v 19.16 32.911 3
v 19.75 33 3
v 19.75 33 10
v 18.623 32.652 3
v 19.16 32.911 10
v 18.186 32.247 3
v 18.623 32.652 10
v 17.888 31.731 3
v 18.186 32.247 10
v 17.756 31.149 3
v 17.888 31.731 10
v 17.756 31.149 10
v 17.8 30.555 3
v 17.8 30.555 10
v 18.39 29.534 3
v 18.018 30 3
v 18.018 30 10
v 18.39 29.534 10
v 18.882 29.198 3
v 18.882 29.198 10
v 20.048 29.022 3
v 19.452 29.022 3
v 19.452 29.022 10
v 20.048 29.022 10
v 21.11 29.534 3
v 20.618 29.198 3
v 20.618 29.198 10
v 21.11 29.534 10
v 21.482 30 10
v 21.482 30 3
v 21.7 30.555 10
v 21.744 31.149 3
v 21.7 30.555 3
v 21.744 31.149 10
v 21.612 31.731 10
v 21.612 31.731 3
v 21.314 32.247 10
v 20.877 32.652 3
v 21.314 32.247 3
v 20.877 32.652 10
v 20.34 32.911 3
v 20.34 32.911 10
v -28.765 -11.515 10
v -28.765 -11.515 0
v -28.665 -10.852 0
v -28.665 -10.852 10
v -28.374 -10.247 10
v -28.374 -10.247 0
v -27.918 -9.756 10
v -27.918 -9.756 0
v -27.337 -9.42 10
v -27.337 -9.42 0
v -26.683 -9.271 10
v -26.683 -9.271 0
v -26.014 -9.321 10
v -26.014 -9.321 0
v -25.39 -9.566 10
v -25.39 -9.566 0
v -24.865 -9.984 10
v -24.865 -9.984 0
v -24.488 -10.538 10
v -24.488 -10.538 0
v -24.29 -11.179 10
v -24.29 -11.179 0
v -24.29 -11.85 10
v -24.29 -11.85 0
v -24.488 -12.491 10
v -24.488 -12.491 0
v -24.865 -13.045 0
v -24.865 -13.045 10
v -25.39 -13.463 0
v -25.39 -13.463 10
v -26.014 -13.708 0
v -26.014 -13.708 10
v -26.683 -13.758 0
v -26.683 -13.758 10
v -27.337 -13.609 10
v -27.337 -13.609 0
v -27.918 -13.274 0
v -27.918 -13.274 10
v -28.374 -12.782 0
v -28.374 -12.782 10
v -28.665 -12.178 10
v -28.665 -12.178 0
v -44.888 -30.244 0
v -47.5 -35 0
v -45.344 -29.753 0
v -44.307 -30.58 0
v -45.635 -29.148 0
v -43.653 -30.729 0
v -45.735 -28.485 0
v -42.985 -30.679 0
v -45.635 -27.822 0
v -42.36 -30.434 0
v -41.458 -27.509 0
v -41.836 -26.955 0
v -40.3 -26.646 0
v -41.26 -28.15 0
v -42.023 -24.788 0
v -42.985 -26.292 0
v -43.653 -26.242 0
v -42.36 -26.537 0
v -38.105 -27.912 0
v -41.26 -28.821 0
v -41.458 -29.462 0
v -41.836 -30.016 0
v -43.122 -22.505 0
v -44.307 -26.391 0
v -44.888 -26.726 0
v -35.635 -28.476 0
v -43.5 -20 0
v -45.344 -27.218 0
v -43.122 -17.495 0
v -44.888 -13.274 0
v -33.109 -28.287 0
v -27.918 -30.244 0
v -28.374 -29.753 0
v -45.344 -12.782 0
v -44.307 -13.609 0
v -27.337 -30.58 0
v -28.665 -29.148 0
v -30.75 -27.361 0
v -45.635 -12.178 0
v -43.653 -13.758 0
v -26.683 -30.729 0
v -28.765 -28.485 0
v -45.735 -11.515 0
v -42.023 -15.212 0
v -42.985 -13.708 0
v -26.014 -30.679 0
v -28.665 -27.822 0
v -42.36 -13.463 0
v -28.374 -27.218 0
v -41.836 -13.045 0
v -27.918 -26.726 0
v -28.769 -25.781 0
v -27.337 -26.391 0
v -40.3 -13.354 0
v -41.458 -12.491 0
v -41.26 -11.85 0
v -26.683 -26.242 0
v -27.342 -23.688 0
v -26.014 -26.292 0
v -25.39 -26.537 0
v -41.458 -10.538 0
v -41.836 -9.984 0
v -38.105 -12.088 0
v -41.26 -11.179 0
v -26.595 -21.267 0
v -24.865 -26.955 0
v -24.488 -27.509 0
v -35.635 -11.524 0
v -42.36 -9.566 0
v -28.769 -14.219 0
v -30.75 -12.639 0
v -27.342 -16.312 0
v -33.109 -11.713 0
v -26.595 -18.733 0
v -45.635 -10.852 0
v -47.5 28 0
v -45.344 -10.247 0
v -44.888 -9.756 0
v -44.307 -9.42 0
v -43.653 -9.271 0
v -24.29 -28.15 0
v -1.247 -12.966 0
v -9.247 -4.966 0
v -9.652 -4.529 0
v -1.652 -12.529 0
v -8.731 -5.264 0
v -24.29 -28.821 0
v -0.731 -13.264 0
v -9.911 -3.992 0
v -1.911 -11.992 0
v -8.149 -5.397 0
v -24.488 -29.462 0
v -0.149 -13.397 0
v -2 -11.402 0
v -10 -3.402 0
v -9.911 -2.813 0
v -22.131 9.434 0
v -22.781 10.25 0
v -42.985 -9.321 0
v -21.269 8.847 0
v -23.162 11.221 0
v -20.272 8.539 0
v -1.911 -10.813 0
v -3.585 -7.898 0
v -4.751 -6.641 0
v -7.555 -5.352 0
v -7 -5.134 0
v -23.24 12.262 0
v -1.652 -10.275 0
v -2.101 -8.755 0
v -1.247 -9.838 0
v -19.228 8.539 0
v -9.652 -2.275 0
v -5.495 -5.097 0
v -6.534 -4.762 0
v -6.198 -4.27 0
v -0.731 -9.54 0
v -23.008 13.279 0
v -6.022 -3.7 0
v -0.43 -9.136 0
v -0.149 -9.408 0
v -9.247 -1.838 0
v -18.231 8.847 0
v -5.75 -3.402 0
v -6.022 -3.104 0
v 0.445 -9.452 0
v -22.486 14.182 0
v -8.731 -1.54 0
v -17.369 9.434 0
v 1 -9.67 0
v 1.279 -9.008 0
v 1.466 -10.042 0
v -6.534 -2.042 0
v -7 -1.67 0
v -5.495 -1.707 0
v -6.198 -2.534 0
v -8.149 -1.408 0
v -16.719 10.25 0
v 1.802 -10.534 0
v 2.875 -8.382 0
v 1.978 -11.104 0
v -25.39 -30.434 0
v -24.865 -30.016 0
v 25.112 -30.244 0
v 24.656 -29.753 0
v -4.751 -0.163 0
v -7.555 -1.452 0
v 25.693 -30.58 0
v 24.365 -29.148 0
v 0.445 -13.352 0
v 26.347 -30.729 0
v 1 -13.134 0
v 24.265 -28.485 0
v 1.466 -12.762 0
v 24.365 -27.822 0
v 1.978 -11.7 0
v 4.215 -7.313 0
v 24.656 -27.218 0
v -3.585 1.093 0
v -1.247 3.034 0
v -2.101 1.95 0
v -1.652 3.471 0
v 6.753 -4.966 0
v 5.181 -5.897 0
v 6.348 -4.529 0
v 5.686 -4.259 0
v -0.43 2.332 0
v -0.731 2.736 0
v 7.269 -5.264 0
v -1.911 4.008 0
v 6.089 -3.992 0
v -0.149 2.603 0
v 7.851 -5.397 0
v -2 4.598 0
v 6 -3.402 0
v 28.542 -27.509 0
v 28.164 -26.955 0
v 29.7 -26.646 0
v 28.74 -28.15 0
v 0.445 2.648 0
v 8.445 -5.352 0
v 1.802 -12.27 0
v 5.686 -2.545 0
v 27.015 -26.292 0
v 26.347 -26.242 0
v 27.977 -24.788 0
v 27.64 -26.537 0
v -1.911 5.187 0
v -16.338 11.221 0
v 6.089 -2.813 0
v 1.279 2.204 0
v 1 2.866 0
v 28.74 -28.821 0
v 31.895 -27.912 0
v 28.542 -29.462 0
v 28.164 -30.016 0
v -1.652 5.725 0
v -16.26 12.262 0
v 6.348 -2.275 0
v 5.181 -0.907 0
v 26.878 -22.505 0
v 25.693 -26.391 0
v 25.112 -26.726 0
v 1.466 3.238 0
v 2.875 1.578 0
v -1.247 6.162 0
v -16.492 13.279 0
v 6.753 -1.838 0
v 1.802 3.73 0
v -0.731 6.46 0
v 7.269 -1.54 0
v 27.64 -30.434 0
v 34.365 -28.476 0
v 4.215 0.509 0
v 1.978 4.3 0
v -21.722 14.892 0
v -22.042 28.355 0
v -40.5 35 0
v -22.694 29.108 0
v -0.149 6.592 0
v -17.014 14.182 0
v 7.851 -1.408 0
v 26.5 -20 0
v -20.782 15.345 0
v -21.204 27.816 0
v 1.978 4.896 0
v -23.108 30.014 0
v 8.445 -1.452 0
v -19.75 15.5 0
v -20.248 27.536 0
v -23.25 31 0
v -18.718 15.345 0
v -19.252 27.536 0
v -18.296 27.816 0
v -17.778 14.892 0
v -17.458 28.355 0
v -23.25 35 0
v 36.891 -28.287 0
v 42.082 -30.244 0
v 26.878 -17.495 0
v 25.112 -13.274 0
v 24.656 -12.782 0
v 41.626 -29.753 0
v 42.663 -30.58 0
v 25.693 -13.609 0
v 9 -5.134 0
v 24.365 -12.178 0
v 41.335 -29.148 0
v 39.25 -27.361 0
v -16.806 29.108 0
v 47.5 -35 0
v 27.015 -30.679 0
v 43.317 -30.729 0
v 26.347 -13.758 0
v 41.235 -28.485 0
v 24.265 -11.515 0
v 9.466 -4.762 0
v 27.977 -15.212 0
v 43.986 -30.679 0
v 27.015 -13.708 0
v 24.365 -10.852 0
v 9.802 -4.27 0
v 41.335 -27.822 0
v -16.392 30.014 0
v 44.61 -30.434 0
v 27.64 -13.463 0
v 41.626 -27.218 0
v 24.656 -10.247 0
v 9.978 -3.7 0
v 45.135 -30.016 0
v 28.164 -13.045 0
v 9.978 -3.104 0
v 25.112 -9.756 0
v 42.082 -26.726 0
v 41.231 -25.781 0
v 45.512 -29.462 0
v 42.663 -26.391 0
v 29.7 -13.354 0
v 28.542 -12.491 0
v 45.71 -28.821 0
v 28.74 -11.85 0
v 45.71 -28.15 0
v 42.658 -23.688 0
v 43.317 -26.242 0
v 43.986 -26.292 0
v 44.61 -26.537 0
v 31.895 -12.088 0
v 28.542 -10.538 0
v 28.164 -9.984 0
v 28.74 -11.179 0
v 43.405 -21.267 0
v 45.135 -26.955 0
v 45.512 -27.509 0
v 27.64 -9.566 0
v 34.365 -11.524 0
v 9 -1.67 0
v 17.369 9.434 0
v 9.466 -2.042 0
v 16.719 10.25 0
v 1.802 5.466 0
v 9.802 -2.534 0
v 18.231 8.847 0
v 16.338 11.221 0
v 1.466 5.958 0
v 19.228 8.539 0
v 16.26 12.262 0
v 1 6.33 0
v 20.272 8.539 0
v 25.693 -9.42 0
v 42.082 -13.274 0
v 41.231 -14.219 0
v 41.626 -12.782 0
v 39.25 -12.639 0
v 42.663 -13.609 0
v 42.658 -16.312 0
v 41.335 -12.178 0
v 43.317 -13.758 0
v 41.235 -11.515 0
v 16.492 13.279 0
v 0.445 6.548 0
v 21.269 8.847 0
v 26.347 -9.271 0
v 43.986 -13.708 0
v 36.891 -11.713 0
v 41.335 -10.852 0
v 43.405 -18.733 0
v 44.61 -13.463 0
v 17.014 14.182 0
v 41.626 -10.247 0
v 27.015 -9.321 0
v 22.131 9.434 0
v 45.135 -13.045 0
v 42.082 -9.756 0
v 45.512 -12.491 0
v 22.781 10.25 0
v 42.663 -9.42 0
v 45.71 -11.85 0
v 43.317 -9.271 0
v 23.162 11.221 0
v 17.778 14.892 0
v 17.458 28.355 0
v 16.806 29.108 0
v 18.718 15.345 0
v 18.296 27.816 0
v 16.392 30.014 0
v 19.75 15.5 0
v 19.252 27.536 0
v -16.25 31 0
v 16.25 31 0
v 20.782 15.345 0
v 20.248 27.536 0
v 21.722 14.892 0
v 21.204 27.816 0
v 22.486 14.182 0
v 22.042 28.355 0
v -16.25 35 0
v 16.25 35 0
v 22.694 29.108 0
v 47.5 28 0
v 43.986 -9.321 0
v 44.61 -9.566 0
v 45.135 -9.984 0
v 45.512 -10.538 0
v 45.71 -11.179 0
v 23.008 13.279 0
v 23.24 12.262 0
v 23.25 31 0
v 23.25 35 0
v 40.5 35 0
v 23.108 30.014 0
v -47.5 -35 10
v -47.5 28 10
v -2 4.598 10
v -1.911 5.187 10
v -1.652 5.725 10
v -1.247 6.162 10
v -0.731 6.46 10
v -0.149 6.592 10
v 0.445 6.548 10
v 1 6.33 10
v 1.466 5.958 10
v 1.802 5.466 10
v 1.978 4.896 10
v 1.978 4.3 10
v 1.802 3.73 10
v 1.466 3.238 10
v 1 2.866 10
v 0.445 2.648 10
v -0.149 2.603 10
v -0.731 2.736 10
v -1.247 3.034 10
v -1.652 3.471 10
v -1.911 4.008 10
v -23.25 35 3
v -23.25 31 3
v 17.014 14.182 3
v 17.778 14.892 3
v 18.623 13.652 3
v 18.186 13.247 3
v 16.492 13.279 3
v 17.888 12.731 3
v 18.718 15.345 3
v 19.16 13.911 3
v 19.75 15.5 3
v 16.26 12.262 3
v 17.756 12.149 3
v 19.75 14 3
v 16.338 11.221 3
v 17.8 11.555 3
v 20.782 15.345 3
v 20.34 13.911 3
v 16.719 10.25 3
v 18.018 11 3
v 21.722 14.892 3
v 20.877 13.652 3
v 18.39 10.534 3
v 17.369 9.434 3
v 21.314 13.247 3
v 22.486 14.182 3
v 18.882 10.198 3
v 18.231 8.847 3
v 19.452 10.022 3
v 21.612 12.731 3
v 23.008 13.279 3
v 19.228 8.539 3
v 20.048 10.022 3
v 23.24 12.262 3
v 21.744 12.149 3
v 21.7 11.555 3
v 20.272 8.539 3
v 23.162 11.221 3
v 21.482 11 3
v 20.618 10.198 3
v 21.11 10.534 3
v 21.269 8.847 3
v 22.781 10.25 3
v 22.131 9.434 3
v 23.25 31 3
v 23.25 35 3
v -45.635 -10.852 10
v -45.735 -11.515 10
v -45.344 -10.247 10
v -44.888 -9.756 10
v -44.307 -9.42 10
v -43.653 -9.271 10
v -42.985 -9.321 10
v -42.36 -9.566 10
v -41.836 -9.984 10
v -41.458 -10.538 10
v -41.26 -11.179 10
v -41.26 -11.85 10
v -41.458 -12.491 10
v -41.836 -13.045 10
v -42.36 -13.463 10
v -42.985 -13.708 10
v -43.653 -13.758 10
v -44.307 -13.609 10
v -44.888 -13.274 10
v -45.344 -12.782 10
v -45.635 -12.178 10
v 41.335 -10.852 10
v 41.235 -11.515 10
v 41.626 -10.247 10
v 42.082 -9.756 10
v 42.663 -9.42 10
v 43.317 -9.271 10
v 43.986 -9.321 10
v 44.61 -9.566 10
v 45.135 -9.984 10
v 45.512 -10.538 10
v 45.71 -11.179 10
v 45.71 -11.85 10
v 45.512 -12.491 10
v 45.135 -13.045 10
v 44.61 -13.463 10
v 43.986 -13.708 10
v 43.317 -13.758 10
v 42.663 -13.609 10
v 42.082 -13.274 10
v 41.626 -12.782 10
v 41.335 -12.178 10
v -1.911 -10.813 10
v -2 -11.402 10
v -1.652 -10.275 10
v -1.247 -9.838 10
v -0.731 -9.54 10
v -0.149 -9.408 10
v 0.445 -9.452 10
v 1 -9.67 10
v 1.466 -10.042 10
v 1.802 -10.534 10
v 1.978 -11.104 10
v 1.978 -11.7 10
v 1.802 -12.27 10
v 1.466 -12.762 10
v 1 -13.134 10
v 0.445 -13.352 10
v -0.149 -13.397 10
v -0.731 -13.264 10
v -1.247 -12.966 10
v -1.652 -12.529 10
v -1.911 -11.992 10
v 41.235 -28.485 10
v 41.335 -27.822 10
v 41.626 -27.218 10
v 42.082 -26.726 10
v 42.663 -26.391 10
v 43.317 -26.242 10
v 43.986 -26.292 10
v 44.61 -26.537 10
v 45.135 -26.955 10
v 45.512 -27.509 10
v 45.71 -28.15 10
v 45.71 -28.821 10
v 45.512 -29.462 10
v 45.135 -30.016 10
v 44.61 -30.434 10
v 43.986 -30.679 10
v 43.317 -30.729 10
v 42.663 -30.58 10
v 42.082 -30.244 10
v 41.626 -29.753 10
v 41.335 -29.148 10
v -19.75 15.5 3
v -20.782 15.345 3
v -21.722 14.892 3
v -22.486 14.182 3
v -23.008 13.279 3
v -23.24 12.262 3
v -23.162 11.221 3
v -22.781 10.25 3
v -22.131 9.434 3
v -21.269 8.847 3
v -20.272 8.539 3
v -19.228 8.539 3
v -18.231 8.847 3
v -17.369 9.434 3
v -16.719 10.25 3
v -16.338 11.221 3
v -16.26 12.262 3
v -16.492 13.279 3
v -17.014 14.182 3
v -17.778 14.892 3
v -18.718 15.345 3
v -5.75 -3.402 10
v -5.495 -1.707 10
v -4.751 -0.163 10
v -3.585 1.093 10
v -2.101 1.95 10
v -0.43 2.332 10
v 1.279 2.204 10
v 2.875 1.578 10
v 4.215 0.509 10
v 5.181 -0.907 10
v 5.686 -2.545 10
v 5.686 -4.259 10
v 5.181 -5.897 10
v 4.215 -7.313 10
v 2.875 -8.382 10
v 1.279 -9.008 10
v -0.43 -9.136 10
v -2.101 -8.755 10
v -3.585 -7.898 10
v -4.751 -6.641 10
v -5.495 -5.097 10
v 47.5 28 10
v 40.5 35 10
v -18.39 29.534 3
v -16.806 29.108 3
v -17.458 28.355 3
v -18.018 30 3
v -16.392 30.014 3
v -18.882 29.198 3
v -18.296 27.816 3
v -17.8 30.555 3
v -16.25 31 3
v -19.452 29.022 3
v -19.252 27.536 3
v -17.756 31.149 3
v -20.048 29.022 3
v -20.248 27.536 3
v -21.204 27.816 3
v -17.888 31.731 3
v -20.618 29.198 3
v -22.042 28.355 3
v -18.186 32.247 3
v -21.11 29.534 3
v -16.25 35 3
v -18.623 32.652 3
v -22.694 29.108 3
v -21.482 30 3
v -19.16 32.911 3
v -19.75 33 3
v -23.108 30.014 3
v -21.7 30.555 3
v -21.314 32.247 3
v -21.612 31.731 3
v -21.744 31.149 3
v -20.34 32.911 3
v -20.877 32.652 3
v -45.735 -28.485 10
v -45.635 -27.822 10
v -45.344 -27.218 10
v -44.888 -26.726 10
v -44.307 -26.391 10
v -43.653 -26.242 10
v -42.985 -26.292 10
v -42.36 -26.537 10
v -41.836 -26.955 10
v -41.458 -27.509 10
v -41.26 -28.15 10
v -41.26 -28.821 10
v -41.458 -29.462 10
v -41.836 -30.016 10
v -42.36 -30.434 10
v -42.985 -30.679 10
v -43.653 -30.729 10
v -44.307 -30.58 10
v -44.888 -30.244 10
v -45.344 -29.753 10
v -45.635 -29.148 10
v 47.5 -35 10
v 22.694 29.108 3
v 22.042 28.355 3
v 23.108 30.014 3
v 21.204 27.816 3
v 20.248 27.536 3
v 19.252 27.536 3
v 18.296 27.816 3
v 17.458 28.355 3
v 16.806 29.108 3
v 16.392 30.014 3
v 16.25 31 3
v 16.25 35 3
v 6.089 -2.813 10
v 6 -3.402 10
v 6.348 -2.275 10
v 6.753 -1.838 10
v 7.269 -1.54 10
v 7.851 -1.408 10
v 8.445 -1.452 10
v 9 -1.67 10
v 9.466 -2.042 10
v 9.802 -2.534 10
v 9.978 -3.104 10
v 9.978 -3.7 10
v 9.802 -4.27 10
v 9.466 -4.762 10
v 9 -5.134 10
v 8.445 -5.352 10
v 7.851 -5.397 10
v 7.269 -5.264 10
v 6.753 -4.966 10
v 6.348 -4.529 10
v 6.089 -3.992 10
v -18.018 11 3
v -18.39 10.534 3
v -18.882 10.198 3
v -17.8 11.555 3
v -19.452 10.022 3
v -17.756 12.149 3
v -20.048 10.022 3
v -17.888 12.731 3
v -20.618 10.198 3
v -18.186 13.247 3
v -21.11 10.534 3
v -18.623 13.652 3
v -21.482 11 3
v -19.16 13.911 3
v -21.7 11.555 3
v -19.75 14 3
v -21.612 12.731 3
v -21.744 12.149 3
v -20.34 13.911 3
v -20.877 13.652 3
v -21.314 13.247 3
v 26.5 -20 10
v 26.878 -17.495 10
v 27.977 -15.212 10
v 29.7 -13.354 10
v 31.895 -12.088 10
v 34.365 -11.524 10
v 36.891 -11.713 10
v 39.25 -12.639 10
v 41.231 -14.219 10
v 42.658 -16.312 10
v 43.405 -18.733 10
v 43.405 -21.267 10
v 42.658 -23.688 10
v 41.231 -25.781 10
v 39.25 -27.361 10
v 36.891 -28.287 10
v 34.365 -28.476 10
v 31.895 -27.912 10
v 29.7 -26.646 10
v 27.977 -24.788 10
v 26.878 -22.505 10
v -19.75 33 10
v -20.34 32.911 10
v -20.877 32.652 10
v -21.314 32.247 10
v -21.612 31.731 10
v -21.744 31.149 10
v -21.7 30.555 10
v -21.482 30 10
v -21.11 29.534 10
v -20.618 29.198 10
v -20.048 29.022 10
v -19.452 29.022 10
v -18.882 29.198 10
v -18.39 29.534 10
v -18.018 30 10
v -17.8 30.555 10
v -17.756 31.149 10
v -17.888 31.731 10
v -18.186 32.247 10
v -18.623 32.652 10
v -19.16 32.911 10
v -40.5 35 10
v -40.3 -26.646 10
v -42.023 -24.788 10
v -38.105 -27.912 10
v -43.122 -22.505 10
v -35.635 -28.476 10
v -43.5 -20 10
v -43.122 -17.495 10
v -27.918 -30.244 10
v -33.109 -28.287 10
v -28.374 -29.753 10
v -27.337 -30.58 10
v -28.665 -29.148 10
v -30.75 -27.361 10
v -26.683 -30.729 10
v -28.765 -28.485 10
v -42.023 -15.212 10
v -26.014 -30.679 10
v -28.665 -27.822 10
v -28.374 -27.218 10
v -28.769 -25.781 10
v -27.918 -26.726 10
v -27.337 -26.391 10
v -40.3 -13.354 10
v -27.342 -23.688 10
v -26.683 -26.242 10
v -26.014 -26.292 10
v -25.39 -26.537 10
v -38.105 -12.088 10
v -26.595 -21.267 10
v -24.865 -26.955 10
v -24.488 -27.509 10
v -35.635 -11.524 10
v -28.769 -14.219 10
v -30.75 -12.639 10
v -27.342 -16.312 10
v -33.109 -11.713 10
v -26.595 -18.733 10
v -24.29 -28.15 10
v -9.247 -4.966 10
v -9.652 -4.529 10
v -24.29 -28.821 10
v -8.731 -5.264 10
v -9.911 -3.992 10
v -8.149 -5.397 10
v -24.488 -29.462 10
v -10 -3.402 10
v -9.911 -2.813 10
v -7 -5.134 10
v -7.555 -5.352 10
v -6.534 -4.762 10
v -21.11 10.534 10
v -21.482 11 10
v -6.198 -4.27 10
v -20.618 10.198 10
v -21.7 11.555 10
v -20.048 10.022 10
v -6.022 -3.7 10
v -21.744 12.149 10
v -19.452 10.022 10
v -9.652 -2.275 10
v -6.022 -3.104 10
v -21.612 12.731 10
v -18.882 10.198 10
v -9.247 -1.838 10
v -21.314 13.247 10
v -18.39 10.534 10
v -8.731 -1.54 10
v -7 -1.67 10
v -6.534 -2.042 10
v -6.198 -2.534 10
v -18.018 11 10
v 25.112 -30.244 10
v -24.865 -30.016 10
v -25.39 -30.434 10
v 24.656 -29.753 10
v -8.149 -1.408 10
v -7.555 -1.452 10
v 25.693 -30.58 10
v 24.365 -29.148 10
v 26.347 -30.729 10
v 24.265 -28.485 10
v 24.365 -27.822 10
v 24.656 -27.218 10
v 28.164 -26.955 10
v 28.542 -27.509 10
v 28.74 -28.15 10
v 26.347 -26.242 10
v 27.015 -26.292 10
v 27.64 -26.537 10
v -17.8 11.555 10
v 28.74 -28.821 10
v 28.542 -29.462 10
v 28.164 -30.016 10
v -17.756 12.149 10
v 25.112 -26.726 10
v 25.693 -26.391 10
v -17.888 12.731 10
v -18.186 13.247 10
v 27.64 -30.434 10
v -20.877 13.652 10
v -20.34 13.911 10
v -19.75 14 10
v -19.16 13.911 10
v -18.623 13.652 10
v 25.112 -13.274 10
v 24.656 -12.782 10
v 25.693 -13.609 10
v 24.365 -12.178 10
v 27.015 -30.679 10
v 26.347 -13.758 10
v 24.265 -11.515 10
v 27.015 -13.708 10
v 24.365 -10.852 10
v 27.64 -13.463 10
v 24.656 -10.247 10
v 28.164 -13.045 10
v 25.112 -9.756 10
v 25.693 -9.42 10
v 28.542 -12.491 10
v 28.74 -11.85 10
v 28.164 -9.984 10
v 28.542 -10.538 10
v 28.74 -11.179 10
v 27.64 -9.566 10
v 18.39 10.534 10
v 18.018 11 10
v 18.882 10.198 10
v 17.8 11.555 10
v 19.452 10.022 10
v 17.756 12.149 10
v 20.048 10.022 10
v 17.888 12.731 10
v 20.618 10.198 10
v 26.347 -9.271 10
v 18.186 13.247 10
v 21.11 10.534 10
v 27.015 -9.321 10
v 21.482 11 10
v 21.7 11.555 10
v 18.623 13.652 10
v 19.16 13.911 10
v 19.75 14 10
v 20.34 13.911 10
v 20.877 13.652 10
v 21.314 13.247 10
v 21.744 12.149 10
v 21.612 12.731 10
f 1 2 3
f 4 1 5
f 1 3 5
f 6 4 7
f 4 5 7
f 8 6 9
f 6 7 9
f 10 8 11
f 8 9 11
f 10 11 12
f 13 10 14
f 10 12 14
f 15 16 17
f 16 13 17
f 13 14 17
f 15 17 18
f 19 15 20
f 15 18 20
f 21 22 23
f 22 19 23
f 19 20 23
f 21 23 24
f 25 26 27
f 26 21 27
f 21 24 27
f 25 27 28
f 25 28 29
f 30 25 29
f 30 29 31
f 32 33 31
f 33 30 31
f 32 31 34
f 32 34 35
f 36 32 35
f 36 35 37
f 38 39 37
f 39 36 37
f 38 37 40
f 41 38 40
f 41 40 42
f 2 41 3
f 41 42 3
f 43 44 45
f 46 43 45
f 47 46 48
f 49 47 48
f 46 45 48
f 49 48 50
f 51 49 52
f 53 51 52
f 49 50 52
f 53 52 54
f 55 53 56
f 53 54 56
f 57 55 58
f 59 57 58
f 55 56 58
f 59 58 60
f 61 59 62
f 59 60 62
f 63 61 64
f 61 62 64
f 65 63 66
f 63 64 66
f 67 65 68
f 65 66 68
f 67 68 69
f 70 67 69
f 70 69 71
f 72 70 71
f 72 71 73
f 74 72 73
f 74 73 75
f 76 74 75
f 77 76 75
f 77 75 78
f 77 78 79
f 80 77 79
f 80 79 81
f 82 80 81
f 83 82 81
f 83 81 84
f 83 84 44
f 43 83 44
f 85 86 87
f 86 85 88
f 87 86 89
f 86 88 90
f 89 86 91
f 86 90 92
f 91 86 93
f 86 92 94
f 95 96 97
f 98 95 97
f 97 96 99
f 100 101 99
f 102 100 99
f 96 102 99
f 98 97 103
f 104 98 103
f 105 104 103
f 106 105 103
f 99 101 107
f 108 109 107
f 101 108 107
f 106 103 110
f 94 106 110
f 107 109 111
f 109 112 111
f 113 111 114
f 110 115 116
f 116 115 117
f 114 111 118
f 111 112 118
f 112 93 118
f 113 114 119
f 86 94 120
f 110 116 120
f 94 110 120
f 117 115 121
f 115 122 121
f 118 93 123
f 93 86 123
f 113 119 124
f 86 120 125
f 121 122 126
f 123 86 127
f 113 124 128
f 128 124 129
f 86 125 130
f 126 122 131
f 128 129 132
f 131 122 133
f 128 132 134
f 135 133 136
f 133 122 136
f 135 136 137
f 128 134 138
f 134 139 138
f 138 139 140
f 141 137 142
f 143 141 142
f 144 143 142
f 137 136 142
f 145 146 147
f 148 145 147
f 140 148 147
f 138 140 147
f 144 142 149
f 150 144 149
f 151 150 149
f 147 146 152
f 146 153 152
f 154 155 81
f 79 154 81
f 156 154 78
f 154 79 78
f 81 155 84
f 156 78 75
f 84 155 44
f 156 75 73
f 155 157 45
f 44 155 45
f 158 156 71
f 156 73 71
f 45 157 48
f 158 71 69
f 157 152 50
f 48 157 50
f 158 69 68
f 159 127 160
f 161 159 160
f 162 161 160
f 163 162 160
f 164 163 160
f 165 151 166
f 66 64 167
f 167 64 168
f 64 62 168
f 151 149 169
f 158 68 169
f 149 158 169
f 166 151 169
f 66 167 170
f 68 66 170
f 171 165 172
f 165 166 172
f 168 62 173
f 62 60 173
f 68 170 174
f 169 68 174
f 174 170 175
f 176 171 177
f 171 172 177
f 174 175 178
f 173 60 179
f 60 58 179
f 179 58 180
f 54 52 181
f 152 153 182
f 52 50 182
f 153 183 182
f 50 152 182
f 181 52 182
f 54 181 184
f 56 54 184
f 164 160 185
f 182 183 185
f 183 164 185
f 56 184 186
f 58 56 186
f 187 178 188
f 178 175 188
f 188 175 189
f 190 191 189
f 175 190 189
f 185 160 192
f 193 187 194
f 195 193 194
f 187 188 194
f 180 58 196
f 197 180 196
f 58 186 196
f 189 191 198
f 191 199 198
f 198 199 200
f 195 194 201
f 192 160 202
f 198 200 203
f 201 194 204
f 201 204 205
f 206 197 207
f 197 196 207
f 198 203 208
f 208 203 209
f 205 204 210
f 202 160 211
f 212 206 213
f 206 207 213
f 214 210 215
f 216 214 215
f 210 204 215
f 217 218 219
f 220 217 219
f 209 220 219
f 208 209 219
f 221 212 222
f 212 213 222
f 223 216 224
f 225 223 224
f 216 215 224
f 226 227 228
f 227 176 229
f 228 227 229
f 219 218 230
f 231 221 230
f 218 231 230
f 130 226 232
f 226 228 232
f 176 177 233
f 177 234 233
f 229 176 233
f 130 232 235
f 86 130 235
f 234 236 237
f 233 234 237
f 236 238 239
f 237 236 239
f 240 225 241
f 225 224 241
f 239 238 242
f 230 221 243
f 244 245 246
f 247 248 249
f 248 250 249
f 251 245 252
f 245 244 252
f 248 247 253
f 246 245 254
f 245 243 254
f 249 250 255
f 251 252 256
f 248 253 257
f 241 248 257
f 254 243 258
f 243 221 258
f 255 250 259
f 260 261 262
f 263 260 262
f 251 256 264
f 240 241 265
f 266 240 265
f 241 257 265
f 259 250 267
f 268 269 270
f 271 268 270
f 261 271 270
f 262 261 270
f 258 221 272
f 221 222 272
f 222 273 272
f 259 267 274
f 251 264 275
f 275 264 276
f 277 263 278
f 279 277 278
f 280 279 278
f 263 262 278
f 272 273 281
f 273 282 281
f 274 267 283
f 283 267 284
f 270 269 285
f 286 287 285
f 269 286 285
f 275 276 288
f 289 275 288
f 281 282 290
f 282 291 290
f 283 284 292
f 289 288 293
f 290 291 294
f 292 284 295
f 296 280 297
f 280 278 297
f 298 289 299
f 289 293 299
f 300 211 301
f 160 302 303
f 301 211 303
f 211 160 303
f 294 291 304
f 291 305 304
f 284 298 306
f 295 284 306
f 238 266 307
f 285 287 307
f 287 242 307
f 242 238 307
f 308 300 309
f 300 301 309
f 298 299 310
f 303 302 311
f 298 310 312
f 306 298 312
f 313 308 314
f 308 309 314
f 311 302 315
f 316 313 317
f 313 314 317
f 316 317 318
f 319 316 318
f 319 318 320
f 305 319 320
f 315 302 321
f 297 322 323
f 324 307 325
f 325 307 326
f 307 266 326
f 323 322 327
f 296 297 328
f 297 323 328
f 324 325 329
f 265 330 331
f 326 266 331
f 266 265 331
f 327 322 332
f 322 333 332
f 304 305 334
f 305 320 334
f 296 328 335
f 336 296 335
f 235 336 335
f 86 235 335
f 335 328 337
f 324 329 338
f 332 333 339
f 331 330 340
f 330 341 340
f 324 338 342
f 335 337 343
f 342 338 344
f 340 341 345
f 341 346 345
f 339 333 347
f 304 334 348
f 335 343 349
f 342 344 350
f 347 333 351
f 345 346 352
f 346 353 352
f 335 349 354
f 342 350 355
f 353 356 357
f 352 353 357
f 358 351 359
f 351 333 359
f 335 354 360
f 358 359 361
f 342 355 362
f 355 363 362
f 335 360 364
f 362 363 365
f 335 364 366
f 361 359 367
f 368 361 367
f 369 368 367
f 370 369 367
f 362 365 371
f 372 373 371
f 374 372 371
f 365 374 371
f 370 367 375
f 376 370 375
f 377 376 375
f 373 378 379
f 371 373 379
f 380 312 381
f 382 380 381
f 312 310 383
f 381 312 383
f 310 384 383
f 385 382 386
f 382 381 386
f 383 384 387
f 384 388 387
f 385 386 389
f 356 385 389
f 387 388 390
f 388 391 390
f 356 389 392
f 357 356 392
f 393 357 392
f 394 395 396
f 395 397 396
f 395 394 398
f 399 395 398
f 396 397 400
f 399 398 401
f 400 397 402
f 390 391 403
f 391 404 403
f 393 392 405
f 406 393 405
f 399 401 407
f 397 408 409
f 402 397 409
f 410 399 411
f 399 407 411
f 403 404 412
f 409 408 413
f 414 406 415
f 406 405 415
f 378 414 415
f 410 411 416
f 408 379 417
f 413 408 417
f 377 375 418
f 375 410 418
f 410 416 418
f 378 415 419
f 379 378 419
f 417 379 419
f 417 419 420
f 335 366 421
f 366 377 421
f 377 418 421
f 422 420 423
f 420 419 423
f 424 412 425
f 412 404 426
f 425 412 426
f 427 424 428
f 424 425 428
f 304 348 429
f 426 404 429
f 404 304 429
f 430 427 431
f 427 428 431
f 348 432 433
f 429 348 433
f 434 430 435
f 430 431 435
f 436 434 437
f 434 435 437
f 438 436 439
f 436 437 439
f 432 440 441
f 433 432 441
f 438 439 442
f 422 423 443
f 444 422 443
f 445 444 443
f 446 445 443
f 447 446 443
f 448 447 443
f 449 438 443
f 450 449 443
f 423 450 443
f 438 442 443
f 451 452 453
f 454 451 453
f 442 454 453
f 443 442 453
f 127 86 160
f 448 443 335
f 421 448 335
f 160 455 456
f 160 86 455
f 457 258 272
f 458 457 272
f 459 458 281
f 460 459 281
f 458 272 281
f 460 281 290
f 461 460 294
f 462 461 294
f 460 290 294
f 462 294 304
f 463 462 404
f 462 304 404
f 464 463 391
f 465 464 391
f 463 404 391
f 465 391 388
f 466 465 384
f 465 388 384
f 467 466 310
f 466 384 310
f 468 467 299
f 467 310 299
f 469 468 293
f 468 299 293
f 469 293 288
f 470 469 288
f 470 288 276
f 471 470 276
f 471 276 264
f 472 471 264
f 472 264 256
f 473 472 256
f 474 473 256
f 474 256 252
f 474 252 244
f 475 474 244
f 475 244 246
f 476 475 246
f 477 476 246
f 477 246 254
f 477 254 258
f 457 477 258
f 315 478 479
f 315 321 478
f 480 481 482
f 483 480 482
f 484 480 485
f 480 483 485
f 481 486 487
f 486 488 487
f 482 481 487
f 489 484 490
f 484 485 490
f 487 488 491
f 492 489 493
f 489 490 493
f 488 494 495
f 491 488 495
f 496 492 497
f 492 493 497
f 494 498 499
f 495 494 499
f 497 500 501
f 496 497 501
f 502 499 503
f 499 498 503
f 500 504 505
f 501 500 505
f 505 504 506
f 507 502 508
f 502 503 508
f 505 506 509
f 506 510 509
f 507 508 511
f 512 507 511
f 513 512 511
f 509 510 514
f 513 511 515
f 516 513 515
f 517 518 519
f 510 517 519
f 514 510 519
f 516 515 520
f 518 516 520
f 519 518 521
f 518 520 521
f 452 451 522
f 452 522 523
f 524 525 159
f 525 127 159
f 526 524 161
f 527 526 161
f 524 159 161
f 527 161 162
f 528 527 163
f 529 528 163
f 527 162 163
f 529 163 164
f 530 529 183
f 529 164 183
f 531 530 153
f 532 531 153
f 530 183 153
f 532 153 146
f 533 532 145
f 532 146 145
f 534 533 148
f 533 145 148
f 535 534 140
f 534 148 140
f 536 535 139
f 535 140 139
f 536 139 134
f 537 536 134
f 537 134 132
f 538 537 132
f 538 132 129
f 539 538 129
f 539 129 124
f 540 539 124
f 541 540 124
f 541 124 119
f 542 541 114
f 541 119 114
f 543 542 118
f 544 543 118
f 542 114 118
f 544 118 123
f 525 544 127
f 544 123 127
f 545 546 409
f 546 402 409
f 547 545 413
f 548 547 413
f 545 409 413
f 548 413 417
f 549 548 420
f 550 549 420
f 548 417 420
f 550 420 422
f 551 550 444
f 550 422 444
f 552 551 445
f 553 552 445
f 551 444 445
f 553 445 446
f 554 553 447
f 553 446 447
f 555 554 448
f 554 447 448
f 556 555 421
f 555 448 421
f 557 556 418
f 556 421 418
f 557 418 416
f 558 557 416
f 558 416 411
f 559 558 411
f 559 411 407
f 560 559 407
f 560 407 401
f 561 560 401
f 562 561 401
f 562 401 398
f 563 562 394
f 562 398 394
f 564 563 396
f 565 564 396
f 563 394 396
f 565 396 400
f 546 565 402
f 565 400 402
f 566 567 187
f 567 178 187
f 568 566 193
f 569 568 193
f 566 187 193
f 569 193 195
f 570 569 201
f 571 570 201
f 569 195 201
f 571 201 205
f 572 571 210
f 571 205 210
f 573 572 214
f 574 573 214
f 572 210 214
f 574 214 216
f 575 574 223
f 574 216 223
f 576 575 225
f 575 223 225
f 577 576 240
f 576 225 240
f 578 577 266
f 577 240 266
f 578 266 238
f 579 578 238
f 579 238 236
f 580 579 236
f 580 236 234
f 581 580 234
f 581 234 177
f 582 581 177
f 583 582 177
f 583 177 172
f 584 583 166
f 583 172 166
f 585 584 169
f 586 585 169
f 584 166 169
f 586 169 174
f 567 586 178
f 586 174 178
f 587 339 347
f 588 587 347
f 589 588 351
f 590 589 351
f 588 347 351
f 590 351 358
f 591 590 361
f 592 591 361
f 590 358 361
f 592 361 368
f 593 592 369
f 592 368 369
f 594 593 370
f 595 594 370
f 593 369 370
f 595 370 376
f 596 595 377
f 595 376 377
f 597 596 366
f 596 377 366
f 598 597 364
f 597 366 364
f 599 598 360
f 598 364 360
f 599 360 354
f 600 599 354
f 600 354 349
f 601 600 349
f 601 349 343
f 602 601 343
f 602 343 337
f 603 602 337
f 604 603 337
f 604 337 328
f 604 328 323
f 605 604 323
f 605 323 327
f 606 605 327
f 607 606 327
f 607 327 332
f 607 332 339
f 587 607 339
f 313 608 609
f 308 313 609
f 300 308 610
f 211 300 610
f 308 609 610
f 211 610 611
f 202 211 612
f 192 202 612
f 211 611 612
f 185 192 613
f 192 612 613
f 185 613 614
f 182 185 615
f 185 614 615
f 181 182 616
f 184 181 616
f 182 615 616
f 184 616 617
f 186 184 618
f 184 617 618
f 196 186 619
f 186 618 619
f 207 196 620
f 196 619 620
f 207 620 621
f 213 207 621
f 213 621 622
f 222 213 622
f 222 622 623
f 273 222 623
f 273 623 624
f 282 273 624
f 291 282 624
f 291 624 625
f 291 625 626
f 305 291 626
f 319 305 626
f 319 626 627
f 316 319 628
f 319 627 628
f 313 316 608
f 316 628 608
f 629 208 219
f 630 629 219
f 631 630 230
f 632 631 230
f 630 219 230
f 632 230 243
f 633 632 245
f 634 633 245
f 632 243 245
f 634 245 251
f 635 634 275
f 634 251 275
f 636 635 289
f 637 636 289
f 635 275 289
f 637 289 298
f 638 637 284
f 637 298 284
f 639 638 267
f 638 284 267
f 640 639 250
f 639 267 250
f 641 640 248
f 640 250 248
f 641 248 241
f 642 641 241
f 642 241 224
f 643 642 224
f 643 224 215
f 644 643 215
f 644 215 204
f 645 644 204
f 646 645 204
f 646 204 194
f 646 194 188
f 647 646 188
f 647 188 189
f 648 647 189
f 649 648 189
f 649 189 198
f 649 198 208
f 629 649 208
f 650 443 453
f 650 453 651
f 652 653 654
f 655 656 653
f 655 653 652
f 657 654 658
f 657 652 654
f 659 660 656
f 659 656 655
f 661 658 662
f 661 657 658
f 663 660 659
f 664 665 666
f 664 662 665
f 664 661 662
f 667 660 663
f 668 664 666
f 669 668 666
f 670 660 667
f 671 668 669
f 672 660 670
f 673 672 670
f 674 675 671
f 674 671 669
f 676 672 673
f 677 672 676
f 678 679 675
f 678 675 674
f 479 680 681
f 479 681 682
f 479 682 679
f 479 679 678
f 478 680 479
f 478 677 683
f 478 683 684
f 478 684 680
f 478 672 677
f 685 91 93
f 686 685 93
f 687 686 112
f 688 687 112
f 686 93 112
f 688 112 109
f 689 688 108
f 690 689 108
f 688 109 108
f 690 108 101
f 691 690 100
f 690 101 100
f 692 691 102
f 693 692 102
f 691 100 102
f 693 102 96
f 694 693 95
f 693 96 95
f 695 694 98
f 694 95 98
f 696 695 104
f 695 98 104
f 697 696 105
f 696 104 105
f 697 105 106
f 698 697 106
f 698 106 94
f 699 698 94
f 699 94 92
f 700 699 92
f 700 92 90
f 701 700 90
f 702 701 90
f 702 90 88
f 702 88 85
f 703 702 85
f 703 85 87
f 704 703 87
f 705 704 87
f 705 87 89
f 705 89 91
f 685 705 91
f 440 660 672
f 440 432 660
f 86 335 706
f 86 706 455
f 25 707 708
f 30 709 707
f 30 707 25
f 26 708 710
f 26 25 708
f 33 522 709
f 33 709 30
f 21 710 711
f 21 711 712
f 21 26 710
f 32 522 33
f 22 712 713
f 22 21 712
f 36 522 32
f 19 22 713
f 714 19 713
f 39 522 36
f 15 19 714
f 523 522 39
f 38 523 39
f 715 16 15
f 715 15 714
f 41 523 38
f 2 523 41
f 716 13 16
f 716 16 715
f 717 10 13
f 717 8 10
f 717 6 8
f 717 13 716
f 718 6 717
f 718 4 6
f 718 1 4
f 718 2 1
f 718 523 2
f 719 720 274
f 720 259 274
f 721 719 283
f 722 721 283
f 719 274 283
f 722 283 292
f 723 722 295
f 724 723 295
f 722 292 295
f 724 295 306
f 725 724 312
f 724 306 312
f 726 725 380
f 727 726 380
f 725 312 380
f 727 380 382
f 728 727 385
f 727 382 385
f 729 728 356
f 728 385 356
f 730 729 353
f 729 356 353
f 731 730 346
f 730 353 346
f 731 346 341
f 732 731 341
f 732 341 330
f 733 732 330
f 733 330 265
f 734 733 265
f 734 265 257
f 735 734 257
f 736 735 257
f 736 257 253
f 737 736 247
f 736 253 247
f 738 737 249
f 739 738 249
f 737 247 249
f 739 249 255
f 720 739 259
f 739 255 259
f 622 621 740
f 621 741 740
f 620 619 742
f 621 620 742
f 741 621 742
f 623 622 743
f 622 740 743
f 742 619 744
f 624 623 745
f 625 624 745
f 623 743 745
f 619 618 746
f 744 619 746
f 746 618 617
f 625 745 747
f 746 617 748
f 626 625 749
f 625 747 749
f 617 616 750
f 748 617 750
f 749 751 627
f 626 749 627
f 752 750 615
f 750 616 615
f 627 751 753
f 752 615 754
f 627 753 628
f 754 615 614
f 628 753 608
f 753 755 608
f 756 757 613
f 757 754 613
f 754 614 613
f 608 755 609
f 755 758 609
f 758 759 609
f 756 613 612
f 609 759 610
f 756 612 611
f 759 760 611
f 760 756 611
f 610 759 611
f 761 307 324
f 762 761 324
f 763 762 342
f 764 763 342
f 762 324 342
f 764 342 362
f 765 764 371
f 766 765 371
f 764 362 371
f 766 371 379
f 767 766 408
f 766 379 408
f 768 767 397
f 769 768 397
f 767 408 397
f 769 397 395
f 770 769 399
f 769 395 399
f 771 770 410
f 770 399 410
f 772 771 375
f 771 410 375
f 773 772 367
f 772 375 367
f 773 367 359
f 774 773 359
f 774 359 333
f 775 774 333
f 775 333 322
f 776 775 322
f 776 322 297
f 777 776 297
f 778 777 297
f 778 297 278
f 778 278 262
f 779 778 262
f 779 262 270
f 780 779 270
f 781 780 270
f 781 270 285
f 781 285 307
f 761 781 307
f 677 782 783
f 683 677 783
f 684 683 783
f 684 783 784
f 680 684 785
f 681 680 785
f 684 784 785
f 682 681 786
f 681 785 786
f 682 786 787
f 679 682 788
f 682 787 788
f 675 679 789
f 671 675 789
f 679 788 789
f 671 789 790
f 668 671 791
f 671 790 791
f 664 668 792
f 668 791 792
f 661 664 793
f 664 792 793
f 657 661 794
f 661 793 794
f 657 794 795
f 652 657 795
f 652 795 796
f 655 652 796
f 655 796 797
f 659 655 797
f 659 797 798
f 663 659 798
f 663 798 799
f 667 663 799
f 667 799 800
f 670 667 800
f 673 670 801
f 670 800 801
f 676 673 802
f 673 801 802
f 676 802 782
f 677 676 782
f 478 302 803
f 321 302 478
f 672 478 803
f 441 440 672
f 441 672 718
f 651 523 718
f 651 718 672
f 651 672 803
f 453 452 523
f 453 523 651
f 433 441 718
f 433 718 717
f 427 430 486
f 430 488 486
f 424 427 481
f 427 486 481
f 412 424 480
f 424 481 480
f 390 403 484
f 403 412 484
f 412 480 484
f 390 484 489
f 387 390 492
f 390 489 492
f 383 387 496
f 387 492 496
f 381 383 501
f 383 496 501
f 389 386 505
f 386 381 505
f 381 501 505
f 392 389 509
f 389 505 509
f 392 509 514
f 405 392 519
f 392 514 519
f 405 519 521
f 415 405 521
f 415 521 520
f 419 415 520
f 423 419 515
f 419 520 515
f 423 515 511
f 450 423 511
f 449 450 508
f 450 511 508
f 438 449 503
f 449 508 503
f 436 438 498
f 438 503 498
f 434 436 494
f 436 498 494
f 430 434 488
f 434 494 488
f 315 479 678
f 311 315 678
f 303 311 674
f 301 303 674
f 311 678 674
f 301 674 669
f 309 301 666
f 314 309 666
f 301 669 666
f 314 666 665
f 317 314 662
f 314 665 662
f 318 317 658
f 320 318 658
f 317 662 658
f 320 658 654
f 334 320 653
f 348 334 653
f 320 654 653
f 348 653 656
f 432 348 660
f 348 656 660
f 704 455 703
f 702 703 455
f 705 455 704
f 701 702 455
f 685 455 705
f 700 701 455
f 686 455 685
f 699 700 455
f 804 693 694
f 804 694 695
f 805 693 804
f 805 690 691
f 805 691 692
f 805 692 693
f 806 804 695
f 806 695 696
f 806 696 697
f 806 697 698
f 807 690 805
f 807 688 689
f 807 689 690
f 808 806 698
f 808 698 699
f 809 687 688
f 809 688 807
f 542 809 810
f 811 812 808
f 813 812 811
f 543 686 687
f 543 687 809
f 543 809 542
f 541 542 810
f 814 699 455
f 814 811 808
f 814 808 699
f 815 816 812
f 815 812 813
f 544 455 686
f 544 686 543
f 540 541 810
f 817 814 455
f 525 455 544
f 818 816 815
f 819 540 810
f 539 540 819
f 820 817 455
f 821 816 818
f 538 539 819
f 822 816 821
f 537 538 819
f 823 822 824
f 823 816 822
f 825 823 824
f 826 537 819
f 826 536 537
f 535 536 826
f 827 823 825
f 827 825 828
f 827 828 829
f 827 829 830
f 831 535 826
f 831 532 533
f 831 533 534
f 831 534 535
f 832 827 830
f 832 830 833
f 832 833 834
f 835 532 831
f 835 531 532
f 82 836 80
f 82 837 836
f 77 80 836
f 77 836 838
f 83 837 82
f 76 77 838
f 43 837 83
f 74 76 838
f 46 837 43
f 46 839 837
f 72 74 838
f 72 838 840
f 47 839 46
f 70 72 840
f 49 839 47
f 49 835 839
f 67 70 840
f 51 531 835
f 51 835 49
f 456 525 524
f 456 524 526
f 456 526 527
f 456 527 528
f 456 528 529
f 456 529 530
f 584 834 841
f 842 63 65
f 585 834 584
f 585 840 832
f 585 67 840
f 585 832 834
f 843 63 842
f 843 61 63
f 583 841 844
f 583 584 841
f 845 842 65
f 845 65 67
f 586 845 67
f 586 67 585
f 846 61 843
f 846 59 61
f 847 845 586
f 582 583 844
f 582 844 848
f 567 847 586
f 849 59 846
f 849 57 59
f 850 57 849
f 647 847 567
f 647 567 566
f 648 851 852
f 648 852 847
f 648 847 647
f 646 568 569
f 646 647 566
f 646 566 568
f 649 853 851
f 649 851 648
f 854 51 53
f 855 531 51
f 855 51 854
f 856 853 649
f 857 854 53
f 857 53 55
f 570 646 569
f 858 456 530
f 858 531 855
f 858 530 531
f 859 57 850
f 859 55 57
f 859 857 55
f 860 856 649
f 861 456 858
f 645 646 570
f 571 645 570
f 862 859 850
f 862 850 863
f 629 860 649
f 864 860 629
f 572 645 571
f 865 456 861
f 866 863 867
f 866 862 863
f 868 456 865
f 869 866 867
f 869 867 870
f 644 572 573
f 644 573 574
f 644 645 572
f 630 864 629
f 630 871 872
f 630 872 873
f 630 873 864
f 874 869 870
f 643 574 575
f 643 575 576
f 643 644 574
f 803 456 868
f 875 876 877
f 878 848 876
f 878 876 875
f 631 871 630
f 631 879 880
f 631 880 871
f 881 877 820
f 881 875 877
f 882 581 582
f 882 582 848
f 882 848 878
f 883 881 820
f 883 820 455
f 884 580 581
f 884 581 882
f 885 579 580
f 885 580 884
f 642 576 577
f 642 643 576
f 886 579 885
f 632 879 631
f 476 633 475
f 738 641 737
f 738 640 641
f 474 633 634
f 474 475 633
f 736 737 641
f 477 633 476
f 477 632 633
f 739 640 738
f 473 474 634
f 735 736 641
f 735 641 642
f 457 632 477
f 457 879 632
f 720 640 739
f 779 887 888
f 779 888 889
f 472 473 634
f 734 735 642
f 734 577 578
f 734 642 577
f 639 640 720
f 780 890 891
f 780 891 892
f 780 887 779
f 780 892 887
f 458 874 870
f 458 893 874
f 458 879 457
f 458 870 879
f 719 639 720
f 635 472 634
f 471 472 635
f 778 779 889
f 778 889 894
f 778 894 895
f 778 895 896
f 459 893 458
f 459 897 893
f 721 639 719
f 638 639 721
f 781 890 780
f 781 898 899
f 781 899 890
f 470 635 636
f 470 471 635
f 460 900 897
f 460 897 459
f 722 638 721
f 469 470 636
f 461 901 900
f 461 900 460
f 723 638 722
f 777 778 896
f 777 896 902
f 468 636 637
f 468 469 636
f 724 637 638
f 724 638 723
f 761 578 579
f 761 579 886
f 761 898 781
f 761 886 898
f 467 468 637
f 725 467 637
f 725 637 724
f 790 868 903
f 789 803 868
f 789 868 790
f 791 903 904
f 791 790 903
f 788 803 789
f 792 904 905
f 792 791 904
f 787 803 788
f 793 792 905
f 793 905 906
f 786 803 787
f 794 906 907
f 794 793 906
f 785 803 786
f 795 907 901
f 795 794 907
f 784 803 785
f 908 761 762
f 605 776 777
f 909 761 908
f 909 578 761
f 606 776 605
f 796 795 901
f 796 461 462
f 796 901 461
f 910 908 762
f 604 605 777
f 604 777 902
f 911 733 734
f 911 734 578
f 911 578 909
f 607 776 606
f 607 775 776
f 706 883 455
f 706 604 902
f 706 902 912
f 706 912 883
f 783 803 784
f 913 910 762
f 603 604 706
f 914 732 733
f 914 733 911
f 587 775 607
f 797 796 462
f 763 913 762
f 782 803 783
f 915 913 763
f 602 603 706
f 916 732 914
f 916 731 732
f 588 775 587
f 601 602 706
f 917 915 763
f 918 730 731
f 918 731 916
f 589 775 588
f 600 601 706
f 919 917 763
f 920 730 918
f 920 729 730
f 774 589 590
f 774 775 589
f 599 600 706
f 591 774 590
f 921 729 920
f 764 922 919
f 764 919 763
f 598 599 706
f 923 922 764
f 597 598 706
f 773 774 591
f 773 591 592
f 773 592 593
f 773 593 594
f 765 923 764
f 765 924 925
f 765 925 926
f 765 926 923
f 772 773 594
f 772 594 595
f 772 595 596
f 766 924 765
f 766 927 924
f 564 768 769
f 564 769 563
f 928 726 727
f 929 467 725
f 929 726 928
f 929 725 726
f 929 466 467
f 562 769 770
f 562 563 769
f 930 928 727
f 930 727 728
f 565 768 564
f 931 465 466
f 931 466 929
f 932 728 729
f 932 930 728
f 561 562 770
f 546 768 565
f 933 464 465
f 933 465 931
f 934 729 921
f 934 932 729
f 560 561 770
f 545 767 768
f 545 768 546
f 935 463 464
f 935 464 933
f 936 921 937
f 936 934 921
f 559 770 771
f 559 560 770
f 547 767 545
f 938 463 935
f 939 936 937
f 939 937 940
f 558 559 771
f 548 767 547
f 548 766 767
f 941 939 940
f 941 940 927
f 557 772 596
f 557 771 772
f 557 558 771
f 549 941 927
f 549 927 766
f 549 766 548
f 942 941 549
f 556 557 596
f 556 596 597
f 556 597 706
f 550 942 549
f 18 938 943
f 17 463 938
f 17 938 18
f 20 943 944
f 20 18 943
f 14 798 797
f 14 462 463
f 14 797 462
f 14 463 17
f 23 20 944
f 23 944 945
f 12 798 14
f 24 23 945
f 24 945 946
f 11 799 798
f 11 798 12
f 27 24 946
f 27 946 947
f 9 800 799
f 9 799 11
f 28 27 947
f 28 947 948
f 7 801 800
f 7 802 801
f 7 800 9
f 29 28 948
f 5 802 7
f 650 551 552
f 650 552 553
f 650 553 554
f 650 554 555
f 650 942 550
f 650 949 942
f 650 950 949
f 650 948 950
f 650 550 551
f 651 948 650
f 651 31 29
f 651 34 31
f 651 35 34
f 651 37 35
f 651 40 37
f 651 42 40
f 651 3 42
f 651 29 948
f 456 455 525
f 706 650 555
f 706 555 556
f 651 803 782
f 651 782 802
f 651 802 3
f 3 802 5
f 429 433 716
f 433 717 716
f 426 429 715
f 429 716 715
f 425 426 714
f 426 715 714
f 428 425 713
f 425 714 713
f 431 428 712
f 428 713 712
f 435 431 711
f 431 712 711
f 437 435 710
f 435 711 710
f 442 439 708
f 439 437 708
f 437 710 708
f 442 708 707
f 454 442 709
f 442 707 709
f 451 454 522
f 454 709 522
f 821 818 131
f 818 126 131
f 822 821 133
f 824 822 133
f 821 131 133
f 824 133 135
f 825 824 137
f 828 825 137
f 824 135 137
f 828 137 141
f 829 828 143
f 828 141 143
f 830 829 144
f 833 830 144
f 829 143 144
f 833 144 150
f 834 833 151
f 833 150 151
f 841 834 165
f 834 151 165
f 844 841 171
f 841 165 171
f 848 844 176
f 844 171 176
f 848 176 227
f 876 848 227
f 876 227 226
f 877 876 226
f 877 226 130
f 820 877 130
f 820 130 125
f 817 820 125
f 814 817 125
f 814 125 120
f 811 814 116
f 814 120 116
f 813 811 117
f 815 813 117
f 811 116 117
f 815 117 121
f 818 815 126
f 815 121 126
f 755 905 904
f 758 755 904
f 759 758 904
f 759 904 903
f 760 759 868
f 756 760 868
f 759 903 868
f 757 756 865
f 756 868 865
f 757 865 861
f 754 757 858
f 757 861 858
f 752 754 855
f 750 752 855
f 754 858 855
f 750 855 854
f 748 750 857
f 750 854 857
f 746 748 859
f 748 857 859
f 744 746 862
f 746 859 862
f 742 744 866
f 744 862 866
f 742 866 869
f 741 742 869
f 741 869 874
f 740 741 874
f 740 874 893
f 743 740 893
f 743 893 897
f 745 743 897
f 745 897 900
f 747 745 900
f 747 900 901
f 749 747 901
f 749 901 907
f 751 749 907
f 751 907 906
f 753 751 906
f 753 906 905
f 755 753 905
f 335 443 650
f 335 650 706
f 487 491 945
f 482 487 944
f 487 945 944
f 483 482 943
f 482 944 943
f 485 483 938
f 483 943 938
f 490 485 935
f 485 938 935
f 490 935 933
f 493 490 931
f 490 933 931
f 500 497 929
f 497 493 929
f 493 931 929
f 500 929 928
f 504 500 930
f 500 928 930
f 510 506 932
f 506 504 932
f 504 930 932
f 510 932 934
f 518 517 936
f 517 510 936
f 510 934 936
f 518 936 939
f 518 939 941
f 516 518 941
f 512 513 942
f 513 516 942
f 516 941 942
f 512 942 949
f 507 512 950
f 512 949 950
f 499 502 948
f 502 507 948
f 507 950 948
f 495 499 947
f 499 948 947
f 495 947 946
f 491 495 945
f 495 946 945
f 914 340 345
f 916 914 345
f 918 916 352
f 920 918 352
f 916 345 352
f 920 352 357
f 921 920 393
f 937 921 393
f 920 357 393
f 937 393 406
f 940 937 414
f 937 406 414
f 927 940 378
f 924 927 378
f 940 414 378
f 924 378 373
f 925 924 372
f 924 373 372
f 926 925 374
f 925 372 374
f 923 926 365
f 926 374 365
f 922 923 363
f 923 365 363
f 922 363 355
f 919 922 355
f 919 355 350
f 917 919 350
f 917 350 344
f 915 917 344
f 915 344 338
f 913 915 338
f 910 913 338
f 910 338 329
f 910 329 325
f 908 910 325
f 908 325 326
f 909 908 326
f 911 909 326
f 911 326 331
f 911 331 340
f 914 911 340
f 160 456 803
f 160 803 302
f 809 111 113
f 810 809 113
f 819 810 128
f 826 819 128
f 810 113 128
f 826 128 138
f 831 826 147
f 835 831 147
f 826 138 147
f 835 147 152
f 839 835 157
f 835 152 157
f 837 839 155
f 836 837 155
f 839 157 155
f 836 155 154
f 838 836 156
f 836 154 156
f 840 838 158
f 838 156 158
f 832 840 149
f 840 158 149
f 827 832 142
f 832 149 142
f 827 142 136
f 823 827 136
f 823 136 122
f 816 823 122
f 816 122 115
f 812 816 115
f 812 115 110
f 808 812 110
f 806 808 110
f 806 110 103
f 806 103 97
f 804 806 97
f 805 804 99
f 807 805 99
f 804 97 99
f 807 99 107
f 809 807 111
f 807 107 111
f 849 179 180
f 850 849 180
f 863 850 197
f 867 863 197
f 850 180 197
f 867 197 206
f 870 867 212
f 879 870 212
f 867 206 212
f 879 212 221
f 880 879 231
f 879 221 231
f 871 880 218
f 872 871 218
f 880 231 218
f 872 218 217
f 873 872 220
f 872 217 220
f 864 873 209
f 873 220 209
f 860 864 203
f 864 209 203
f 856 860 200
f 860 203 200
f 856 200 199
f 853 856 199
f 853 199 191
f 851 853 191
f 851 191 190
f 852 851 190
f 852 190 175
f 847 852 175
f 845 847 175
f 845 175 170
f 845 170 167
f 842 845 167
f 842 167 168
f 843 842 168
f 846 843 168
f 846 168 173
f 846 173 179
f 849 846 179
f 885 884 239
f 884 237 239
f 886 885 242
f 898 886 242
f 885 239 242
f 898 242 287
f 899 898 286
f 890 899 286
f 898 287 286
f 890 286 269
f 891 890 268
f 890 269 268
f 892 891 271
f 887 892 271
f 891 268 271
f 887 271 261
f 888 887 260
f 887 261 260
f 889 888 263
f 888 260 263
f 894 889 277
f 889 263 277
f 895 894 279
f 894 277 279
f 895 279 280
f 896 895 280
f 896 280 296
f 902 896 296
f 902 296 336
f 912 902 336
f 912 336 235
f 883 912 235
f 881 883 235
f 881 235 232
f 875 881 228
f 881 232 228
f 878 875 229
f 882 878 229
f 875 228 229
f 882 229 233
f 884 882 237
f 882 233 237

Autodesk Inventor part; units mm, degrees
ref_plane "YZ Plane" through (0, 0, 0) normal (1, 0, 0) x (0, 1, 0)
ref_plane "XZ Plane" through (0, 0, 0) normal (0, 1, 0) x (-1, 0, 0)
ref_plane "XY Plane" through (0, 0, 0) normal (0, 0, 1) x (1, 0, 0)
sketch "Sketch1" plane through (0, 0, 0) normal (0, 0, 1) x (1, 0, 0)
  line L0 (-47.5, 35) -> (47.5, 35)
  line L1 (47.5, 35) -> (47.5, -35)
  line L2 (47.5, -35) -> (-47.5, -35)
  line L3 (-47.5, -35) -> (-47.5, 35)
  point P0 (0, 0)
  point P1 (0, 35)
  point P2 (-47.5, 0)
  dimension "d0" = 95
  dimension "d1" = 70
extrude "Extrusion1" add sketch "Sketch1" along normal blind 10
sketch "Sketch2" plane through (0, 0, 0) normal (0, 0, -1) x (-1, 0, 0)
  line L0 (0, 71.7114) -> (0, -41.7697) construction
  line L1 (-47.5, 35) -> (47.5, 35) construction
  line L2 (-22.5, 19.157) -> (-23.5, 19.157) projected
  circle A0 centre (35, -20) radius 8.5
  line L3 (47.5, -35) -> (-47.5, -35) projected
  line L4 (-47.5, -35) -> (-47.5, 35) projected
  circle A1 centre (43.4853, -28.4853) radius 2.25
  line L5 (47.5, 35) -> (47.5, -35) construction
  line L6 (26.5147, -11.5147) -> (43.4853, -11.5147) construction
  line L7 (43.4853, -11.5147) -> (43.4853, -28.4853) construction
  line L8 (43.4853, -28.4853) -> (26.5147, -28.4853) construction
  line L9 (26.5147, -28.4853) -> (26.5147, -11.5147) construction
  circle A2 centre (43.4853, -11.5147) radius 2.25
  circle A3 centre (26.5147, -11.5147) radius 2.25
  circle A4 centre (26.5147, -28.4853) radius 2.25
  circle A5 centre (-35, -20) radius 8.5
  circle A6 centre (-43.4853, -28.4853) radius 2.25
  circle A7 centre (-43.4853, -11.5147) radius 2.25
  circle A8 centre (-26.5147, -11.5147) radius 2.25
  circle A9 centre (-26.5147, -28.4853) radius 2.25
  point P0 (0, 0)
  point P1 (0, 14.9709)
  point P2 (0, 35)
  point P3 (35, -11.5147)
  point P4 (26.5147, -20)
  dimension "d21" = 15
  dimension "d22" = 12.5
  dimension "d23" = 17
  dimension "d26" = 4.5
  dimension "d27" = 16.9706
  dimension "d28" = 16.9706
extrude "Extrusion2" cut sketch "Sketch2" against normal through all
sketch "Sketch3" plane through (0, 0, 0) normal (0, 0, -1) x (-1, 0, 0)
  circle A0 centre (0, -3.4021) radius 5.75
  circle A1 centre (35, -20) radius 8.5 projected
  line L0 (-47.5, 35) -> (47.5, 35) projected
  line L1 (47.5, 35) -> (47.5, -35) projected
  line L2 (47.5, -35) -> (-47.5, -35) projected
  line L3 (-47.5, -35) -> (-47.5, 35) projected
  circle A2 centre (35, -20) radius 8.5 projected
  circle A3 centre (0, 4.5979) radius 2
  circle A4 centre (-8, -3.4021) radius 2
  circle A5 centre (0, -11.4021) radius 2
  circle A6 centre (8, -3.4021) radius 2
  circle A7 centre (26.5147, -11.5147) radius 2.25 projected
  circle A8 centre (-43.4853, -28.4853) radius 2.25 projected
  circle A9 centre (-43.4853, -11.5147) radius 2.25 projected
  circle A10 centre (26.5147, -28.4853) radius 2.25 projected
  circle A11 centre (43.4853, -11.5147) radius 2.25 projected
  circle A12 centre (-26.5147, -28.4853) radius 2.25 projected
  circle A13 centre (-26.5147, -11.5147) radius 2.25 projected
  circle A14 centre (43.4853, -28.4853) radius 2.25 projected
  circle A15 centre (26.5147, -11.5147) radius 2.25 projected
  circle A16 centre (-43.4853, -28.4853) radius 2.25 projected
  circle A17 centre (-43.4853, -11.5147) radius 2.25 projected
  circle A18 centre (26.5147, -28.4853) radius 2.25 projected
  circle A19 centre (43.4853, -11.5147) radius 2.25 projected
  circle A20 centre (-26.5147, -28.4853) radius 2.25 projected
  circle A21 centre (-26.5147, -11.5147) radius 2.25 projected
  circle A22 centre (43.4853, -28.4853) radius 2.25 projected
  circle A23 centre (-35, -20) radius 8.5 projected
  circle A24 centre (-35, -20) radius 8.5 projected
  line L4 (-47.5, 35) -> (47.5, 35) projected
  line L5 (47.5, 35) -> (47.5, -35) projected
  line L6 (47.5, -35) -> (-47.5, -35) projected
  line L7 (-47.5, -35) -> (-47.5, 35) projected
  point P0 (0, 0)
  point P1 (1.1874, 2.9885)
  point P2 (-1.1874, 2.9885)
  point P3 (0, -3.4021)
  point P4 (0, -35)
  dimension "d10" = 31.5979
  dimension "d12" = 11.5
  dimension "d13" = 4
  dimension "d14" = 8
  dimension "d19" = 360
extrude "Extrusion3" cut sketch "Sketch3" against normal through all contours A0 | A3 | A4 | A5 | A6
sketch "Sketch5" plane through (0, 0, 0) normal (0, 0, -1) x (-1, 0, 0)
  circle A0 centre (19.75, 31) radius 2
  circle A1 centre (19.75, 12) radius 2
  line L0 (47.5, 35) -> (47.5, -35) projected
  line L1 (-47.5, 35) -> (47.5, 35) projected
  point P0 (0, 0)
  dimension "d29" = 27.75
  dimension "d30" = 4
  dimension "d31" = 4
  dimension "d32" = 19
hole "Hole1" at (-19.75, 12, 0) at (-19.75, 31, 0) direction (0, 0, 1) diameter 4 depth 11 tip angle 118 counterbore diameter 7 counterbore depth 3
sketch "Sketch6" plane through (0, 0, 0) normal (0, 0, -1) x (-1, 0, 0)
  line L0 (23.25, 27.5) -> (16.25, 27.5)
  line L1 (16.25, 27.5) -> (16.25, 35)
  line L2 (16.25, 35) -> (23.25, 35)
  line L3 (23.25, 35) -> (23.25, 27.5)
  line L4 (-47.5, 35) -> (47.5, 35) projected
  circle A0 centre (19.75, 31) radius 3.5 projected
  point P0 (0, 0)
  point P1 (16.25, 31)
  point P2 (23.25, 31)
extrude "Extrusion4" cut sketch "Sketch6" against normal up to surface (3 mm away) contours A0 L1 L2 L3
mirror "Mirror1" about plane through (0, 0, 0) normal (1, 0, 0) of "Extrusion4", "Hole1"
chamfer "Chamfer1" distance 7 angle 45 2 edges at (-47.5, 35, 5) (47.5, 35, 5)
equation "\"BendRadius\" = Thickness"
equation "\"BendReliefWidth\" = Thickness"
equation "\"BendReliefDepth\" = 0.5 * Thickness"
equation "\"CornerReliefSize\" = 4 * Thickness"
equation "\"MinimumRemnant\" = 2 * Thickness"
equation "\"TransitionRadius\" = BendRadius"
equation "\"JacobiRadiusSize\" = Thickness"
equation "\"GapSize\" = Thickness"
equation "\"Thickness\" = 0.5"
properties part number "0008-10-001" material "ABS Plastic"
